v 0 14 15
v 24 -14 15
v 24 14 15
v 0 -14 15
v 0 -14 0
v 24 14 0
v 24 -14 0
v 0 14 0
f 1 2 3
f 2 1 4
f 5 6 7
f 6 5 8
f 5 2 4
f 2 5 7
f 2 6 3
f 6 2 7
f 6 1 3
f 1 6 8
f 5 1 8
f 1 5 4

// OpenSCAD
// file: Library/center.scad
module center(axis){
	translate((axis / -2.0)){
		children();
	}
}
// main file
use <Library/center.scad>

//Length, width, height. Length is how far it should stick out from the center of the flue (so the flue radius). The width is the diameter of the object. The height is the height of the object.
dimensions = [24.0, 28.0, 15.0];

//Opening at the bottom. Negative space
module CylinderDispenser_Dispenser_Virgin_Flue_Fireplace(dimensions) {
	center([0, dimensions.y, 0]){
		cube(dimensions);
	}
}

color("red", .5)
CylinderDispenser_Dispenser_Virgin_Flue_Fireplace(dimensions);
